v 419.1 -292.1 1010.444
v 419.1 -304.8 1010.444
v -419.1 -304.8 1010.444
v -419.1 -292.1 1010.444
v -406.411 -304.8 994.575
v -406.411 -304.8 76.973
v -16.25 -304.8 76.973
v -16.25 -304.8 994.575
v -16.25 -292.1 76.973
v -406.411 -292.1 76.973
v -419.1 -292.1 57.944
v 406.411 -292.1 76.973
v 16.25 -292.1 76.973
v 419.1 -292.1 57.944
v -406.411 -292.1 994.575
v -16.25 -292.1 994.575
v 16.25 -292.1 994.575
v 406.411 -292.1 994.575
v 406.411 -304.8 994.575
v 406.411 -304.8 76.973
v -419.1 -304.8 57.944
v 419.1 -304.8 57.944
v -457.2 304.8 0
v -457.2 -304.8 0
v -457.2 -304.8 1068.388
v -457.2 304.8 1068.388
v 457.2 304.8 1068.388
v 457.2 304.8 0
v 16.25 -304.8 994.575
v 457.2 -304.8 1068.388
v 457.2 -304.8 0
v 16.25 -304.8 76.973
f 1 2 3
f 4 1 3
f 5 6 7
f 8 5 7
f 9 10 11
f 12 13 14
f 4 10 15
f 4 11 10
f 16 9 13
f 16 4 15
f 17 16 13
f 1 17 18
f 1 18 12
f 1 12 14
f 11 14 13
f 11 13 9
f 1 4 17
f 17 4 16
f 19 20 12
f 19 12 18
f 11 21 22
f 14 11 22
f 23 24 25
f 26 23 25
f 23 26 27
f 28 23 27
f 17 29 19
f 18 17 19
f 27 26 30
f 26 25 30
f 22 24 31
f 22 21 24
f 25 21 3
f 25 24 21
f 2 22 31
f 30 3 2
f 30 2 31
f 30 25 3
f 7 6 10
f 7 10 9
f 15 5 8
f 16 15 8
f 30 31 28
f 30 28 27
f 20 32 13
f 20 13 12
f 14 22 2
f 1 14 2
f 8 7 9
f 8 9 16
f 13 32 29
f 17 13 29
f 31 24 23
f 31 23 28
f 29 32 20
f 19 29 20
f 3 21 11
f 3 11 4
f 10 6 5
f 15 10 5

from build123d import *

# Parameters (mm, degrees)
F0_W     = 914.4
F0_H     = 1068.3875
F1_DEPTH = 304.8
F3_W     = 419.1
F3_H     = 952.5
F3_W_2   = 390.1610858738
F3_H_2   = 917.601108551
F5_DEPTH = 12.7


# Not quite as in the source:
# - the program builds the solid bodies; features that only make, move or delete a surface that nothing else refers to are left out


with BuildPart() as f1:
    # F0 (on Front) → F1 (new body, symmetric)
    with BuildSketch(Plane.XZ):
        with Locations((0, 534.19375)):
            Rectangle(F0_W, F0_H)
    extrude(amount=F1_DEPTH, both=True)

    # F3 (on face) → F5 (cut)
    with BuildSketch(Plane.XZ.offset(304.8)):
        with Locations((-209.55, 534.19375)):
            Rectangle(F3_W, F3_H)
        with Locations((-211.3307770342, 535.7740521431)):
            Rectangle(F3_W_2, F3_H_2, mode=Mode.SUBTRACT)
        with Locations((209.55, 534.19375)):
            Rectangle(F3_W, F3_H)
        with Locations((211.3307770342, 535.7740521431)):
            Rectangle(F3_W_2, F3_H_2, mode=Mode.SUBTRACT)
    extrude(amount=-F5_DEPTH, mode=Mode.SUBTRACT)


solid = f1.part
